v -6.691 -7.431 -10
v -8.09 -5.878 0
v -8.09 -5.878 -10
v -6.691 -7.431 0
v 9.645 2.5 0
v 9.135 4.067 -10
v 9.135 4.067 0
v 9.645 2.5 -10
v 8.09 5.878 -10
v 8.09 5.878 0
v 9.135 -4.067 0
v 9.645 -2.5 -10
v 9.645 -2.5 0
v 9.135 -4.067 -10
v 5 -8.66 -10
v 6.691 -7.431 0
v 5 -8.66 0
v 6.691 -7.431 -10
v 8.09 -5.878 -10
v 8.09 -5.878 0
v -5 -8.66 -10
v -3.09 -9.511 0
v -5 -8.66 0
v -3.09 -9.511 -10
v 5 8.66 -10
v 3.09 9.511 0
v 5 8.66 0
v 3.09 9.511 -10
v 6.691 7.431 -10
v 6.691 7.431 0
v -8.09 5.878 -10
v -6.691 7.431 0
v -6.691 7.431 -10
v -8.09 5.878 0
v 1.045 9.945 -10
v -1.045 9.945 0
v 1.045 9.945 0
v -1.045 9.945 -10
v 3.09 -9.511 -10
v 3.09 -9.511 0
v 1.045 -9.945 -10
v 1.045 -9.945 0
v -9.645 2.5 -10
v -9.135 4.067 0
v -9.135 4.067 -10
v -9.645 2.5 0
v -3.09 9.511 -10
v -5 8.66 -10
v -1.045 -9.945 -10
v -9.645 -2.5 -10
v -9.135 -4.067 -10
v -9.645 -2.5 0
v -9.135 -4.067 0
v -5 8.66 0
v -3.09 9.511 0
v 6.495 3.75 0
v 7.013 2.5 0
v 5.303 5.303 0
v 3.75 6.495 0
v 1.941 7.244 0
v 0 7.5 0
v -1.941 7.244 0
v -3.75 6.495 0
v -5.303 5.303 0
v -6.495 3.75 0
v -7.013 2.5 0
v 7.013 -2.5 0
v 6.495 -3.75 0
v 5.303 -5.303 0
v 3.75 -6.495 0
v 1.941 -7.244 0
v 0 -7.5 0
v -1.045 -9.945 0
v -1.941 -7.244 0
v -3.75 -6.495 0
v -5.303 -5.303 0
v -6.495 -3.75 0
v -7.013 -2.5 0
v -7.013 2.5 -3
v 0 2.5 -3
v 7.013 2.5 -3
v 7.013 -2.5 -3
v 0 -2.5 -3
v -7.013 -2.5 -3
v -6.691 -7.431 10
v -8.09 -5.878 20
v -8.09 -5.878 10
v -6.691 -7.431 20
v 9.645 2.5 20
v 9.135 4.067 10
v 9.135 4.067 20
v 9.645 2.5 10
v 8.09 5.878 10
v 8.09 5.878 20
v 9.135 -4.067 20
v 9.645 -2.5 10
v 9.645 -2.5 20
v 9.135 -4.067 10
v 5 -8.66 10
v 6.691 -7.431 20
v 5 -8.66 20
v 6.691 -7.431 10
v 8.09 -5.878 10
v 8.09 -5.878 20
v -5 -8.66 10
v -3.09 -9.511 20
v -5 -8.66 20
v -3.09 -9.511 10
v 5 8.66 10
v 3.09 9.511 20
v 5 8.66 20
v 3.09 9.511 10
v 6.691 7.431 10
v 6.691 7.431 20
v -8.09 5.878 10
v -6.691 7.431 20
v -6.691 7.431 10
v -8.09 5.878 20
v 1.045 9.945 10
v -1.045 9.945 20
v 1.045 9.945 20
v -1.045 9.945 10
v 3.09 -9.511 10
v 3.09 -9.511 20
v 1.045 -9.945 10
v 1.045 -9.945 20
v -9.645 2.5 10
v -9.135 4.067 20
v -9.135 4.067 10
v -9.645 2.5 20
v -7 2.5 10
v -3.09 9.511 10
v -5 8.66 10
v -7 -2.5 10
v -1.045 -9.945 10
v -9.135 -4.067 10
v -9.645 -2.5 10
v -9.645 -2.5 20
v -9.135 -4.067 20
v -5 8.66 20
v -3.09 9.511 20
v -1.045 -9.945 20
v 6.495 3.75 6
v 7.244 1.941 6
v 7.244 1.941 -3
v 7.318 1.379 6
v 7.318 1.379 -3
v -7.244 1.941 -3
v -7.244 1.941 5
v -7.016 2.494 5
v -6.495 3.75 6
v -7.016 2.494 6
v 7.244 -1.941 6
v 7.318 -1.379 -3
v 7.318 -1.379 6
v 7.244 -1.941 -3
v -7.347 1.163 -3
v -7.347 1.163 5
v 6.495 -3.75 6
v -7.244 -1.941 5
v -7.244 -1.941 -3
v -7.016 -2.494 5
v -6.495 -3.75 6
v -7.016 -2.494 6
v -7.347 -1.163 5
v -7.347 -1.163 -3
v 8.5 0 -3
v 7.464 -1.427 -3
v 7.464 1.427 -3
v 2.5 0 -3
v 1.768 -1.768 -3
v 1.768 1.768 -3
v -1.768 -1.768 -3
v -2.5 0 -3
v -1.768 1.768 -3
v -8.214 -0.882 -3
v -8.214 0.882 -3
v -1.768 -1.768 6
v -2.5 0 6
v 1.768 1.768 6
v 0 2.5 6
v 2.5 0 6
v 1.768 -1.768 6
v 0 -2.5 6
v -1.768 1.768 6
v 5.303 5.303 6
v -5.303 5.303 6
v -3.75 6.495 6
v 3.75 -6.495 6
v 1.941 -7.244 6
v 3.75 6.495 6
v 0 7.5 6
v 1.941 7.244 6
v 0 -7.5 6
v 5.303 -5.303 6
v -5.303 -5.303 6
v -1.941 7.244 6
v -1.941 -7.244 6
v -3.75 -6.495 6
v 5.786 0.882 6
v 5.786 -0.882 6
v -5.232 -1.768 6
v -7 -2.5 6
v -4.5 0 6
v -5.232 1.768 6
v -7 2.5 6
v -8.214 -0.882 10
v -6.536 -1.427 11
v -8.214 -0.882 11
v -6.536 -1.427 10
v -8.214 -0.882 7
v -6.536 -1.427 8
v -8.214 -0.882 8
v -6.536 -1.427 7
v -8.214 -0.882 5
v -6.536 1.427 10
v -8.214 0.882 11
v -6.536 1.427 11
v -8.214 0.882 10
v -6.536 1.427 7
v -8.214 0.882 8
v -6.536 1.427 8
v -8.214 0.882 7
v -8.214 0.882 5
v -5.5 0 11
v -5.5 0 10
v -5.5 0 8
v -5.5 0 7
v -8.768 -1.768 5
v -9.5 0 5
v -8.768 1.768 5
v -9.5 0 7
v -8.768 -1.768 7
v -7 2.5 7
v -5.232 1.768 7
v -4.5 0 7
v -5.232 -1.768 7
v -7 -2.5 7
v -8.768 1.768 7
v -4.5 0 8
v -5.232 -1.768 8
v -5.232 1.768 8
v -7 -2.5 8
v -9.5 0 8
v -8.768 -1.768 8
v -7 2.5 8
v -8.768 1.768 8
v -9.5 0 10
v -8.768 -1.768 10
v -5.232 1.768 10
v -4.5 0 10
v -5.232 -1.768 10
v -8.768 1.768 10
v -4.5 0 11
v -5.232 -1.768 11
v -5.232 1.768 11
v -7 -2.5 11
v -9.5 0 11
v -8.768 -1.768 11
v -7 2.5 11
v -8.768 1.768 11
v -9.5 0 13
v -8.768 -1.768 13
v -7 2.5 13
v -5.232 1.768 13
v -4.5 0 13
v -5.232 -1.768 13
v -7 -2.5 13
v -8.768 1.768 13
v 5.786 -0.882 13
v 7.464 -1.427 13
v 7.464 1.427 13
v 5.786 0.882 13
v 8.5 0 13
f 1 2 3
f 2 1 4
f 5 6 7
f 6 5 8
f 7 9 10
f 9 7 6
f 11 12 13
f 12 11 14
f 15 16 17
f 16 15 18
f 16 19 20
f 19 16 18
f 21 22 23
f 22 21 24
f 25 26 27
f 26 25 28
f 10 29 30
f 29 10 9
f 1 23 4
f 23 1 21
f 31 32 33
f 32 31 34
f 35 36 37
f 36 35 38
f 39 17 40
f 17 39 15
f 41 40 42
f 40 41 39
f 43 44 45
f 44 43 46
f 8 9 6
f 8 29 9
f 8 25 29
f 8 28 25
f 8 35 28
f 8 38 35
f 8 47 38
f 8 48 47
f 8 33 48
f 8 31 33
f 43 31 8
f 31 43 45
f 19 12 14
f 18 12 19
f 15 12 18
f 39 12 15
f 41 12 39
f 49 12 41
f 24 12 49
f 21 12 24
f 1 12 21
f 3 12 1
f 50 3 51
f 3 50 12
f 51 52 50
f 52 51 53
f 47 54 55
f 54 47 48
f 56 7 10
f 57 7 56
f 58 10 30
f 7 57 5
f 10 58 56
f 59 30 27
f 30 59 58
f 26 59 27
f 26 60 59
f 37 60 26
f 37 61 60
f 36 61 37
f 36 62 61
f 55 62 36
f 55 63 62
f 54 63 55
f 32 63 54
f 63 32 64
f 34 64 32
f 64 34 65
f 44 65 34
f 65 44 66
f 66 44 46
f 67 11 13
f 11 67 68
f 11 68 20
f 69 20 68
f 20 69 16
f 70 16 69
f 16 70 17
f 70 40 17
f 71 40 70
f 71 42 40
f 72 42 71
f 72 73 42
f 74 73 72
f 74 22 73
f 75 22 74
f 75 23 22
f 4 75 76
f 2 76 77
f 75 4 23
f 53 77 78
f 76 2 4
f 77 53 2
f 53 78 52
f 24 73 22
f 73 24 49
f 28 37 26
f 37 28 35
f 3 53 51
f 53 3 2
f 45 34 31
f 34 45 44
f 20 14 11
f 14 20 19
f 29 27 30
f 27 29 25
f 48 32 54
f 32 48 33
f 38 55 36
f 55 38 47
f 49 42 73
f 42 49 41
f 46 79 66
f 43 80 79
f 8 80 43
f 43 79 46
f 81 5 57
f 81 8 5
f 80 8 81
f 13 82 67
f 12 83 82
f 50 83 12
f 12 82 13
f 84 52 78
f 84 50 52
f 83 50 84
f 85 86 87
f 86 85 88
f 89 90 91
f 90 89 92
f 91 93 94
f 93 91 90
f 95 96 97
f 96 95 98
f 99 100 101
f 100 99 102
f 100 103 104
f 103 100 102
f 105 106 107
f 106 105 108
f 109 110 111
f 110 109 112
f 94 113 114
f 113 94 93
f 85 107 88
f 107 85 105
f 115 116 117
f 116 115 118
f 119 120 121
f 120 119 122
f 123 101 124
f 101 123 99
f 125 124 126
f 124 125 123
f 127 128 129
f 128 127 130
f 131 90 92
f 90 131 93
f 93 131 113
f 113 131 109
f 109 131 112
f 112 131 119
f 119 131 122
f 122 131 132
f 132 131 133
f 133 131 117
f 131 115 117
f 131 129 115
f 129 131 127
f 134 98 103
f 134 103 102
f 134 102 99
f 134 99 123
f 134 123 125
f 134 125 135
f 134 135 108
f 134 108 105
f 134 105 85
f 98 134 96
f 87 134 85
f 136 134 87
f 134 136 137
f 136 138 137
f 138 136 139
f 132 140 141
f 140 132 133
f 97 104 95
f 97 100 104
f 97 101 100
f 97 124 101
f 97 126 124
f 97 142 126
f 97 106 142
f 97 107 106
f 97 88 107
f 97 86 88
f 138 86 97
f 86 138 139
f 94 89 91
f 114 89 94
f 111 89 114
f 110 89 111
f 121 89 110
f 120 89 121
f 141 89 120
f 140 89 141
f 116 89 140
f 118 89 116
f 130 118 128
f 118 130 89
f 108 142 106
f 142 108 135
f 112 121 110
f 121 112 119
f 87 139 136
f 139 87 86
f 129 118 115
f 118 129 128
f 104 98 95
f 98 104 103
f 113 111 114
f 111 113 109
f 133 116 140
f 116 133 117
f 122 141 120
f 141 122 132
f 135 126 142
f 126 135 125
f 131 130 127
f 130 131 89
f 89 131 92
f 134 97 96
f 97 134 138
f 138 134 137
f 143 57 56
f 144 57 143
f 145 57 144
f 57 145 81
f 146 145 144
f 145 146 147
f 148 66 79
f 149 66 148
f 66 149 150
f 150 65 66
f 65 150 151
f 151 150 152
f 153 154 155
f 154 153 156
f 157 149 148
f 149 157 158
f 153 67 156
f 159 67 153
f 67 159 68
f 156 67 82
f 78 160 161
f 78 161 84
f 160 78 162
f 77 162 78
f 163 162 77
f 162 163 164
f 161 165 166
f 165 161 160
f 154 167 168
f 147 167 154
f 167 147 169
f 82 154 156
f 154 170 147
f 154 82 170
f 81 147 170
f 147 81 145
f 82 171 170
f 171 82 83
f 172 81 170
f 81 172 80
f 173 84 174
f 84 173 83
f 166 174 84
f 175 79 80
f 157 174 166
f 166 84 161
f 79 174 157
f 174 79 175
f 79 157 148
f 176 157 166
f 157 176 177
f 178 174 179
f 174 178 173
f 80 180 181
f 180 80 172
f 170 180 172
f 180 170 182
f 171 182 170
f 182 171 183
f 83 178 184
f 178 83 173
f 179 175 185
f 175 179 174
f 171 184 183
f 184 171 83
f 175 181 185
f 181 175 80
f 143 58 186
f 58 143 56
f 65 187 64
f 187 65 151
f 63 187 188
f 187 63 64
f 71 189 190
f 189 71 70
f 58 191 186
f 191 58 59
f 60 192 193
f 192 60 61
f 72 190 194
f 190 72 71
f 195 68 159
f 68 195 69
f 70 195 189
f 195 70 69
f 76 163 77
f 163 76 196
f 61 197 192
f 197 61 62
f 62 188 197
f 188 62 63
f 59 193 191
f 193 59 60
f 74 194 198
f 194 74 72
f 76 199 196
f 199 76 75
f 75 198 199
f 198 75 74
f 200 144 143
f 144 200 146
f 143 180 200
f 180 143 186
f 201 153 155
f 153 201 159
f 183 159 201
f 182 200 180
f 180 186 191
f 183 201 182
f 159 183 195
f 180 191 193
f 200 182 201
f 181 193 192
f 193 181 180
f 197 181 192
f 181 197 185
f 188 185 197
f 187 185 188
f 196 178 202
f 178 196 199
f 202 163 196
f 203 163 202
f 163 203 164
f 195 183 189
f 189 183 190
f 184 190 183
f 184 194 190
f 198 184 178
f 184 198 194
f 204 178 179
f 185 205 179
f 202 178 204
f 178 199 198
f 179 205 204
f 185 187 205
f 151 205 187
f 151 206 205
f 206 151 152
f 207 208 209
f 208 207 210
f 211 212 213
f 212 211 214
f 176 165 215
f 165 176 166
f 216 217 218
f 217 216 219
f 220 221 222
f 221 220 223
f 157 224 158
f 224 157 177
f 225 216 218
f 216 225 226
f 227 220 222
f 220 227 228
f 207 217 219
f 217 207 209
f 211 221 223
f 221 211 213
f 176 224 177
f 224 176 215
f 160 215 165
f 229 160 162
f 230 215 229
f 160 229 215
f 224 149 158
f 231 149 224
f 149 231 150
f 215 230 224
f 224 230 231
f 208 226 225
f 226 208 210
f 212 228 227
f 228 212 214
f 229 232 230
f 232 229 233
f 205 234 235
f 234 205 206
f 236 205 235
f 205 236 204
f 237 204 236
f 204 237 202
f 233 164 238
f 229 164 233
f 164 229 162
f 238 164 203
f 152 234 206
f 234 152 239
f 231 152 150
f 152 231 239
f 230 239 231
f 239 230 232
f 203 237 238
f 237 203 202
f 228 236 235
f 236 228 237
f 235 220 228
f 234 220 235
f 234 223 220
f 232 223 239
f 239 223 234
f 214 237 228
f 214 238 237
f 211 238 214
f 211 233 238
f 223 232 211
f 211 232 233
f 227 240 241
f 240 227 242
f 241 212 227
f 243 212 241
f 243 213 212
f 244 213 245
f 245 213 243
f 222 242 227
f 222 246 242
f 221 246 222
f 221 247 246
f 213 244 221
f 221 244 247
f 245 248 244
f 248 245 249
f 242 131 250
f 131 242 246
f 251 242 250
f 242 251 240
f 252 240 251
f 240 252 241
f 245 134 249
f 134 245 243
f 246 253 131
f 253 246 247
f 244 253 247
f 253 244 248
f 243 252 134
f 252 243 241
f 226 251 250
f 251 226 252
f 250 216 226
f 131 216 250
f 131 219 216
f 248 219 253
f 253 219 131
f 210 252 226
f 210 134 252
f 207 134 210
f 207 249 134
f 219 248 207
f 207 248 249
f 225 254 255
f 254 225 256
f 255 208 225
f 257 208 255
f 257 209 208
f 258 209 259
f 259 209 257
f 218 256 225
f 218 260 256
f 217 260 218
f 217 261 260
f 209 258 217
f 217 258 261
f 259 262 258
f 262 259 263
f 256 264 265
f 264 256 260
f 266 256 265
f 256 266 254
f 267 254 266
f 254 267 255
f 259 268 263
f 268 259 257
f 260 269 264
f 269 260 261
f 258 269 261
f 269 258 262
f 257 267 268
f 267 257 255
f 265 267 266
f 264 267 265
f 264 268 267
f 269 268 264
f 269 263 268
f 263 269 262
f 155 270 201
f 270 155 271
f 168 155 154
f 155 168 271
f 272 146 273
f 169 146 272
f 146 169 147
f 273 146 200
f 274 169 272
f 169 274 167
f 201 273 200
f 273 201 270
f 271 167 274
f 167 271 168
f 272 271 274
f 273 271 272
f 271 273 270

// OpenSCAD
// Clamp Hub Module
module clamp_hub() {
    difference() {
        cylinder(h=10, d=20);
        translate([0,0,-1]) cylinder(h=12, d=5); // Shaft hole
        translate([0,0,5]) cube([20, 5, 10], center=true); // Clamp cut
    }
}

// Flexible Element Module
module flexible_element() {
    difference() {
        cylinder(h=3, d=15);
        translate([0,0,-1]) cylinder(h=5, d=5); // Central hole
    }
}

// Spacer Pin Module
module spacer_pin() {
    cylinder(h=10, d=3);
}

// Fastener Screw Module
module fastener_screw() {
    union() {
        cylinder(h=8, d=3);
        translate([0,0,8]) cylinder(h=2, d=5);
    }
}

// Assemble the coupling
module flexible_coupling() {
    translate([0, 0, -10]) clamp_hub();
    translate([0, 0, 10]) clamp_hub();
    
    translate([0, 0, -3]) flexible_element();
    translate([0, 0, 0]) flexible_element();
    translate([0, 0, 3]) flexible_element();
    
    translate([7, 0, -3]) spacer_pin();
    translate([7, 0, 0]) spacer_pin();
    translate([7, 0, 3]) spacer_pin();
    
    translate([-7, 0, -3]) fastener_screw();
    translate([-7, 0, 0]) fastener_screw();
    translate([-7, 0, 3]) fastener_screw();
}

// Render the model
flexible_coupling();
